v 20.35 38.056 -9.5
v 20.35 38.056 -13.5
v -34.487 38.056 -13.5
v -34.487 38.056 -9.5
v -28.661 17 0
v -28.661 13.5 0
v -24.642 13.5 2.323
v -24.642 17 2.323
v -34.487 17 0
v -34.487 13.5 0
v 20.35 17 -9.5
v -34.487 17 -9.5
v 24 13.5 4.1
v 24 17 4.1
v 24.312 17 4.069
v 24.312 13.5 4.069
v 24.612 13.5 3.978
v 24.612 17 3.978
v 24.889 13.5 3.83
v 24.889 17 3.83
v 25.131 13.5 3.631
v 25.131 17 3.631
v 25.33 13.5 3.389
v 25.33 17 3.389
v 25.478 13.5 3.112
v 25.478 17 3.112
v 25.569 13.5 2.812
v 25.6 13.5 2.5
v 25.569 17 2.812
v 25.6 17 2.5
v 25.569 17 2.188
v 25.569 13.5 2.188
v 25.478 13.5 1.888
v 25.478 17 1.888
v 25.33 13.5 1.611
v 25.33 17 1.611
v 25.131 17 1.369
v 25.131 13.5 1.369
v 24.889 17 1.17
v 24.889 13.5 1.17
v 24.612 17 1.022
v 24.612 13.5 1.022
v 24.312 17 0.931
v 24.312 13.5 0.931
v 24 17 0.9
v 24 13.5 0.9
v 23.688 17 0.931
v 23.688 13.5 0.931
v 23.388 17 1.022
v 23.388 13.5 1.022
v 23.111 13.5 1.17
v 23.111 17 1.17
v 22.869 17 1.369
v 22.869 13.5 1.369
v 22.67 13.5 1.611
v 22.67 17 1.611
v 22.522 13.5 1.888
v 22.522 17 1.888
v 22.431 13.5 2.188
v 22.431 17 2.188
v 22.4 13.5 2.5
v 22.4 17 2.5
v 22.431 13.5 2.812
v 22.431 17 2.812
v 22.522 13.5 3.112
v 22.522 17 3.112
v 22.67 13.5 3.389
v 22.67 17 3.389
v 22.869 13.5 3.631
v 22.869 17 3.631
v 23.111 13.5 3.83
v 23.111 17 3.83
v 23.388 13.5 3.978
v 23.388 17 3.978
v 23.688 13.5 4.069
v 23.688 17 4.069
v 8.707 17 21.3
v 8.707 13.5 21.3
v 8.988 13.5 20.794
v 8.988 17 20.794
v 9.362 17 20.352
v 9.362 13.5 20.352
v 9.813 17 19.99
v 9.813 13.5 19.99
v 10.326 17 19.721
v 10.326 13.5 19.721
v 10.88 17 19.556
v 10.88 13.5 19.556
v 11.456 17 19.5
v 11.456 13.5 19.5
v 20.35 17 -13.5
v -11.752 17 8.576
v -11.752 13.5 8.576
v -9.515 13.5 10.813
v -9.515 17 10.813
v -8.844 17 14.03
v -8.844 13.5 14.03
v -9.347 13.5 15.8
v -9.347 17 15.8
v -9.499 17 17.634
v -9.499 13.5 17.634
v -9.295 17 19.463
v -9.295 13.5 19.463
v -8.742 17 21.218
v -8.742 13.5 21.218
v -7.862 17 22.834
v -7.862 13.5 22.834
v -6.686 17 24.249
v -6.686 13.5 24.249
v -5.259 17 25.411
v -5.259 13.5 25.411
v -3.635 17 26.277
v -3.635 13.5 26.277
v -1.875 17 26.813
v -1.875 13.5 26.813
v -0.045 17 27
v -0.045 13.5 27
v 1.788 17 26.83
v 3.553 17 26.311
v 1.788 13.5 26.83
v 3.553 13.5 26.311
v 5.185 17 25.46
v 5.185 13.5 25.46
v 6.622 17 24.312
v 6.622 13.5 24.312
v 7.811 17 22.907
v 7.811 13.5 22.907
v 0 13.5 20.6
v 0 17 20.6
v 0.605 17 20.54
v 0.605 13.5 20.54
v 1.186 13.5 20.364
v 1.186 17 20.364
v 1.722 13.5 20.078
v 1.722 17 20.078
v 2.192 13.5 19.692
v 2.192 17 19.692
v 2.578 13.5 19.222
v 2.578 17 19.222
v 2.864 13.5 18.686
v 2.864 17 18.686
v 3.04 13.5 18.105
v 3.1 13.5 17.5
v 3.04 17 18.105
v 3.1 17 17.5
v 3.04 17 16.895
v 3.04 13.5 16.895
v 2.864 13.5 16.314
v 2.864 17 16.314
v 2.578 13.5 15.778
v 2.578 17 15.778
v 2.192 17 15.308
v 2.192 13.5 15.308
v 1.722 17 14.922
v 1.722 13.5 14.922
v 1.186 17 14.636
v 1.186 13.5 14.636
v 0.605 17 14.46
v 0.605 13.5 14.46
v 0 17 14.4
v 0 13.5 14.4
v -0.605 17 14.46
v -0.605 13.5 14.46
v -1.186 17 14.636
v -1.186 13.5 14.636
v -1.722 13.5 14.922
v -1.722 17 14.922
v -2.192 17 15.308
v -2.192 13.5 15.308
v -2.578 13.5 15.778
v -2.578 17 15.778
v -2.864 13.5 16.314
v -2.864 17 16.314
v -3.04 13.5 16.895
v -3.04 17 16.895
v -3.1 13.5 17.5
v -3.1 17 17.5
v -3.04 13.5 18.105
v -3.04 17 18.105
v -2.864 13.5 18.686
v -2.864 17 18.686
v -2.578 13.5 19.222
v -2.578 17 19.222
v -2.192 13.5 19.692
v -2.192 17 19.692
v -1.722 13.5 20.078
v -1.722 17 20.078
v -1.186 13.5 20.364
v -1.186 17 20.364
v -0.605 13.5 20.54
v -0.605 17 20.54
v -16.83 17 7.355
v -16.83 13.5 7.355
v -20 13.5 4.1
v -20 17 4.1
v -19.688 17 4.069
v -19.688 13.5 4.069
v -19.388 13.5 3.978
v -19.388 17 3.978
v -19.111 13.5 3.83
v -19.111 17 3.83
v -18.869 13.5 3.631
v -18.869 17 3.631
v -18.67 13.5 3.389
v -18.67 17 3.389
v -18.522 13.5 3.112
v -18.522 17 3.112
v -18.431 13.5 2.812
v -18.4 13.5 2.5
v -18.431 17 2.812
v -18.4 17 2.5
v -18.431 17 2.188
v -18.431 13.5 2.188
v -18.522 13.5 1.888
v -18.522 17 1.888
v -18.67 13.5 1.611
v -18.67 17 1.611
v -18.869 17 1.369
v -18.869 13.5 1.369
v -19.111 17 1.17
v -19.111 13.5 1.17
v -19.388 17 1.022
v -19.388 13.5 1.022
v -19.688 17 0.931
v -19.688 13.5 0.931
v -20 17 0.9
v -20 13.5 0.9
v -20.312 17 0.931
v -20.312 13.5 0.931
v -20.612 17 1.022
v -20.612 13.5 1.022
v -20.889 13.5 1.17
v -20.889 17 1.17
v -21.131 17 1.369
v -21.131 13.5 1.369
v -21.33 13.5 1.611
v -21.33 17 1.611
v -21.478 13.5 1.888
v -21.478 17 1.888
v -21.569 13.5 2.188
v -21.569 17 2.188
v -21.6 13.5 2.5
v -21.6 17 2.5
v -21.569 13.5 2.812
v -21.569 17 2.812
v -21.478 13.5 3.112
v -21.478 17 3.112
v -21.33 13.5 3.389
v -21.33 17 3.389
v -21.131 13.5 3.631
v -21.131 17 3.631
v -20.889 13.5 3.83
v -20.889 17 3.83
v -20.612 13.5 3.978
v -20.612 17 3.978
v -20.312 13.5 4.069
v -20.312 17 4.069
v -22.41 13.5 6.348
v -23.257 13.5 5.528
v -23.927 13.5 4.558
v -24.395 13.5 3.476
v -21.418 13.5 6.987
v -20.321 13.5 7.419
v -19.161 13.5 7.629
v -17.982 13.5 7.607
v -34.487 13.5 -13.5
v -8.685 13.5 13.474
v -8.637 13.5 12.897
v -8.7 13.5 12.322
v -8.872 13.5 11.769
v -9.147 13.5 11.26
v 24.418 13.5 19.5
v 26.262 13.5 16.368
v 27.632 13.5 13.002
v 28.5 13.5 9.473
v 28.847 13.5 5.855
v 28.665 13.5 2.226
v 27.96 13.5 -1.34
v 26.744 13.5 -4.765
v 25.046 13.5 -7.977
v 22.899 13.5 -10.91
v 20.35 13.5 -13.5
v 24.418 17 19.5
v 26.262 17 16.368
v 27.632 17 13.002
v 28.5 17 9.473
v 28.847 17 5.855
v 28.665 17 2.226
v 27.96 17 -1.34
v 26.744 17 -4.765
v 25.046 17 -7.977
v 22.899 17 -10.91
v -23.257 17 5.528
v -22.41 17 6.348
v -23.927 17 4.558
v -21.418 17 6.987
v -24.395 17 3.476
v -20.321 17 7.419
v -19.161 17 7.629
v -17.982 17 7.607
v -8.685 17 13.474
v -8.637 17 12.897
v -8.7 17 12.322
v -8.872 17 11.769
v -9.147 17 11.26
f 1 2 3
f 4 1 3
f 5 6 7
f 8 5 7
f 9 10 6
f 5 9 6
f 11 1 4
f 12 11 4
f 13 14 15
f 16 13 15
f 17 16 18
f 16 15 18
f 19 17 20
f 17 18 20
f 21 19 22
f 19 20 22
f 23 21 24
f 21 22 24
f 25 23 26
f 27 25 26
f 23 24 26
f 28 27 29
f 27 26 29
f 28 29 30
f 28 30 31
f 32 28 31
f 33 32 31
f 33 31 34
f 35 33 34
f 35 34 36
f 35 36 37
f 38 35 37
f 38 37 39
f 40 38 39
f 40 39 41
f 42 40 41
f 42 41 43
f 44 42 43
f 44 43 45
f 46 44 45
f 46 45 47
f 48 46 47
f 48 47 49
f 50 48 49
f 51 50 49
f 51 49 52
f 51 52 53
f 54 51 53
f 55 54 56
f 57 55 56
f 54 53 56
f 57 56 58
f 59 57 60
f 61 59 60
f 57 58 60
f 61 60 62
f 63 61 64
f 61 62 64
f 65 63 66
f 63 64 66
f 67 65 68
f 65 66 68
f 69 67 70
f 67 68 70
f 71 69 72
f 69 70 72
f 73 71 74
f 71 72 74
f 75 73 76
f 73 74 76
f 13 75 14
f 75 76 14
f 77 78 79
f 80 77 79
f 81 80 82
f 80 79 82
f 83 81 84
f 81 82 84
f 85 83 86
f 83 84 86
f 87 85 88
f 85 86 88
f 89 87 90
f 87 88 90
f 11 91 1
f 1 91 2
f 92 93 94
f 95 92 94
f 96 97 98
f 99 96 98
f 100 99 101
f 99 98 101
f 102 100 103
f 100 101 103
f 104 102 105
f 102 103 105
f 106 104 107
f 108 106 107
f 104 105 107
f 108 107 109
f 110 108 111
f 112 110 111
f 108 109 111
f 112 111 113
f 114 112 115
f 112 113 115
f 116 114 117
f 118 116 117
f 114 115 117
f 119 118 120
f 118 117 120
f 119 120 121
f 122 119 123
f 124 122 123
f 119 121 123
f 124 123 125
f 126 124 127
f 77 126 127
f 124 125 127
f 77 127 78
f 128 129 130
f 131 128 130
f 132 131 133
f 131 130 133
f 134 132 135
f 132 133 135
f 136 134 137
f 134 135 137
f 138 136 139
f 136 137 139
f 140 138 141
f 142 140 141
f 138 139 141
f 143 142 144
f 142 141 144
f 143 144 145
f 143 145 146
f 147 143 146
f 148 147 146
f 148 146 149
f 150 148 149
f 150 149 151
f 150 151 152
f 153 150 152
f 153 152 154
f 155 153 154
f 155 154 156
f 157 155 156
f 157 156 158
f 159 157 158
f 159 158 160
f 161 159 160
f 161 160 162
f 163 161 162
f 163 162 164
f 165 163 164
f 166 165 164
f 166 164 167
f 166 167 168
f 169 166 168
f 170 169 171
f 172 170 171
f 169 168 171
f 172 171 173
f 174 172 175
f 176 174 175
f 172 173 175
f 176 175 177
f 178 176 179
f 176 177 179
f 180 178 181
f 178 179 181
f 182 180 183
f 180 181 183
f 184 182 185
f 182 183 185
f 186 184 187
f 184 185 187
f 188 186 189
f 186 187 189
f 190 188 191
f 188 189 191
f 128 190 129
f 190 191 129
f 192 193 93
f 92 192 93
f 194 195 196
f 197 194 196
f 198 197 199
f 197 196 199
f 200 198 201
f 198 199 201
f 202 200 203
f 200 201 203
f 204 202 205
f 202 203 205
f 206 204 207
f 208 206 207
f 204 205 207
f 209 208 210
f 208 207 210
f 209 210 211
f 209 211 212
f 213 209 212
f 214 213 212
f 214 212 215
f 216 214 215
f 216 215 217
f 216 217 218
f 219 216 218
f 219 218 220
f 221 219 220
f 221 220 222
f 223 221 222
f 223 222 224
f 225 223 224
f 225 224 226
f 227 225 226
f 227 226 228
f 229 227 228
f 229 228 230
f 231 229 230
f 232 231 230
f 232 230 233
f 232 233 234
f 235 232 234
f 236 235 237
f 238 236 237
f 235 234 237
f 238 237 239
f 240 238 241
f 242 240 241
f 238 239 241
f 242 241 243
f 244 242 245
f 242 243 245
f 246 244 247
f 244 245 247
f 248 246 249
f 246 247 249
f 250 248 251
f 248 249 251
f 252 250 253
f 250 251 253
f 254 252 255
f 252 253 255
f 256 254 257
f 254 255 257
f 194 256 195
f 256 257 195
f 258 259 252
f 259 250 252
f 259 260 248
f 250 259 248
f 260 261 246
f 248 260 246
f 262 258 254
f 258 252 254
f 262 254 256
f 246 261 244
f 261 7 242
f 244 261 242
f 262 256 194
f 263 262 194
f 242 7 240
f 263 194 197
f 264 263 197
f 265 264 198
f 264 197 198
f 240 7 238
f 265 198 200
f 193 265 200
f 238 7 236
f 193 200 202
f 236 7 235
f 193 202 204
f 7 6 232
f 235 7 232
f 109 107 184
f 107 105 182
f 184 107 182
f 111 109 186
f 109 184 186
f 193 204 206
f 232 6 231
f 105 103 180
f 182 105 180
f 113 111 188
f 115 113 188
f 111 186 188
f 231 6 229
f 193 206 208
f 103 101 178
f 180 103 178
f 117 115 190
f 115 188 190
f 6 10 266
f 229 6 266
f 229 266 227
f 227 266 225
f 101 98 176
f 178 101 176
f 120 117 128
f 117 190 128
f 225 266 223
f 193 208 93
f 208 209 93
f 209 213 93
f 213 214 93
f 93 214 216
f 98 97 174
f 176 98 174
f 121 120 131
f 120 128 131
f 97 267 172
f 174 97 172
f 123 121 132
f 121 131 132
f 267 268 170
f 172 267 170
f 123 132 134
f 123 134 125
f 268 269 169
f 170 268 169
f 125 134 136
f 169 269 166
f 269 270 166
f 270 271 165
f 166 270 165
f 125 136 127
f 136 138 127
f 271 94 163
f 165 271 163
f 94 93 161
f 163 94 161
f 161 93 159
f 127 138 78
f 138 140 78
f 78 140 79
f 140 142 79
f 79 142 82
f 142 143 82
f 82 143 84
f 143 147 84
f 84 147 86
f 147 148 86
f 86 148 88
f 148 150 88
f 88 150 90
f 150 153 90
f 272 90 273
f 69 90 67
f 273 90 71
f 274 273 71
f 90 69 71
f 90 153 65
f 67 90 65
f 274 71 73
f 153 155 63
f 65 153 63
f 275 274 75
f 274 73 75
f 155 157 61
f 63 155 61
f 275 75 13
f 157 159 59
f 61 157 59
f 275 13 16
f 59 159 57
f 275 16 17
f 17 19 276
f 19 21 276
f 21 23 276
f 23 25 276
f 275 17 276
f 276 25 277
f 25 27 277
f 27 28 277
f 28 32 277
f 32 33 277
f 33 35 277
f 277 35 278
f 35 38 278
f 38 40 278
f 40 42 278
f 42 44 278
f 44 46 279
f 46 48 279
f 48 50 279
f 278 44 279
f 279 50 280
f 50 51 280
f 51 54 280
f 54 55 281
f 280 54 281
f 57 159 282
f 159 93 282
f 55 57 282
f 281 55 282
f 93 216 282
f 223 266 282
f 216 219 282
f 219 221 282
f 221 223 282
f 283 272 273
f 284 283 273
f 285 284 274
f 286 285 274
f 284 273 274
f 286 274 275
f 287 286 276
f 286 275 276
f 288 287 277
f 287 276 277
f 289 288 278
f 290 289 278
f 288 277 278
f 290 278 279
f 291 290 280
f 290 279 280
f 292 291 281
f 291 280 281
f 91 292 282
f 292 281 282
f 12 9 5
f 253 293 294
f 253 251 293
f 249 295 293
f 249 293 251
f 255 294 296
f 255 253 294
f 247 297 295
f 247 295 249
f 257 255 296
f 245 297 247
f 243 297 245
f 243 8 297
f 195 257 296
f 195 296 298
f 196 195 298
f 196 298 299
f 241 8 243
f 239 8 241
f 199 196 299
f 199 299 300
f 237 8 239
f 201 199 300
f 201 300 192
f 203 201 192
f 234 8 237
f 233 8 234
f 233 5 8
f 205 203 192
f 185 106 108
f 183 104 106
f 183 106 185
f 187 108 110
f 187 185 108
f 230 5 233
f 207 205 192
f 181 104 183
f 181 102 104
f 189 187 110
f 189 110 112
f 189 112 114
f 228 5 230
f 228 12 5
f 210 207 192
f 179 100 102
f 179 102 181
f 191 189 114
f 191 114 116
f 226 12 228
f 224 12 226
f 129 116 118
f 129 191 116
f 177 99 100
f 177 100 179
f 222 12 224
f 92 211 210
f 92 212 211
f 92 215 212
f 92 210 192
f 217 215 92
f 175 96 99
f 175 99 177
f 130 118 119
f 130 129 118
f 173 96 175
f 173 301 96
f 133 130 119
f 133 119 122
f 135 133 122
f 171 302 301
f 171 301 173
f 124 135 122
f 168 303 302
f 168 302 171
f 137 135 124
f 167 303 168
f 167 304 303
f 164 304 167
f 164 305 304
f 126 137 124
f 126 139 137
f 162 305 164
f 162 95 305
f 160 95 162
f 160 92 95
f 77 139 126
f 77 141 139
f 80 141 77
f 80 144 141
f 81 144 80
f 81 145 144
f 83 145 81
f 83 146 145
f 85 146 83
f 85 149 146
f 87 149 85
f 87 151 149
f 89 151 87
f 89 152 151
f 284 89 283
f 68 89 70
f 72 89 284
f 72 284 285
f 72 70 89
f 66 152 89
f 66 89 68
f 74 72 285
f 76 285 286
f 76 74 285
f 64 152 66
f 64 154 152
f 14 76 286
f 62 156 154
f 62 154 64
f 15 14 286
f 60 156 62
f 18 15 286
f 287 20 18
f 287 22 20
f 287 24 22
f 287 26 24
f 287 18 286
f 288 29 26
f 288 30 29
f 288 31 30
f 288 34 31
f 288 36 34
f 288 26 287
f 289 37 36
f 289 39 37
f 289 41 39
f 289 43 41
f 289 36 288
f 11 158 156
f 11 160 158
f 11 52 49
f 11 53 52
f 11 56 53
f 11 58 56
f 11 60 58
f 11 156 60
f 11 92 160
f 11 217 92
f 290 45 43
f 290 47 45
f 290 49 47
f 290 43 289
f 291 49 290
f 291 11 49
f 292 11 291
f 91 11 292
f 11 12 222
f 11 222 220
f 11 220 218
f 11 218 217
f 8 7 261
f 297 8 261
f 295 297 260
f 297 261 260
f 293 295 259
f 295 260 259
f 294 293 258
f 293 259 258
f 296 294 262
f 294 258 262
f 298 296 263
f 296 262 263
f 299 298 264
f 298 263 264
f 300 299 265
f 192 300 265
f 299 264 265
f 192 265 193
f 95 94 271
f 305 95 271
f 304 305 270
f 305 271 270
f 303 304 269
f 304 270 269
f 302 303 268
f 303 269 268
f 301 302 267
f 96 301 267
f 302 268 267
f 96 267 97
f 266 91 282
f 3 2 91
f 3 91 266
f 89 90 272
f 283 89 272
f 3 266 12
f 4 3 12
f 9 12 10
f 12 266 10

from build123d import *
from build123d.topology import SkipClean

# Parameters (mm, degrees)
CROQUIS1_W              = 70
CROQUIS1_H              = 65
EXTRUIR1_DEPTH          = 3.5
CROQUIS2_R              = 3.1
EXTRUIR2_DEPTH          = 5
EXTRUIR3_DEPTH          = 10
CROQUIS4_OUTSIDE_W      = 91.294
CROQUIS4_OUTSIDE_H      = 86.294
EXTRUIR4_DEPTH          = 10
REDONDEO1_R             = 3
EXTRUIR5_DEPTH          = 13.5
EXTRUIR6_DEPTH          = 3.5
CROQUIS7_R              = 1.6
EXTRUIR7_DEPTH          = 47.982330447
CROQUIS8_R              = 3.1
EXTRUIR8_DEPTH          = 5
CROQUIS9_W              = 0.7
CROQUIS9_H              = 10.5
EXTRUIR9_DEPTH          = 10
EXTRUIR10_DEPTH         = 63.752948337
EXTRUIR10_DEPTH_BACK    = 10
CROQUIS10_W             = 3.0625
CROQUIS10_H             = 5
CROQUIS11_W             = 54.8364
CROQUIS11_H             = 21.05596306
SALIENTE_EXTRUIR1_DEPTH = 4


with BuildPart() as part:
    # Croquis1 → Extruir1 (new body)
    with BuildSketch(Plane(origin=(0, 0, 0), x_dir=(1, 0, 0), z_dir=(0, 1, 0))):
        Rectangle(CROQUIS1_W, CROQUIS1_H)
    extrude(amount=EXTRUIR1_DEPTH)

    # Croquis2 → Extruir2 (cut)
    with BuildSketch(Plane(origin=(0, 3.5, 0), x_dir=(1, 0, 0), z_dir=(0, 1, 0))):
        with Locations(Location((0, -17.5, 0), (0, 0, 270))):
            Circle(CROQUIS2_R)
    extrude(amount=-EXTRUIR2_DEPTH, mode=Mode.SUBTRACT)

    # Croquis3 → Extruir3 (add)
    with BuildSketch(Plane(origin=(0, 3.5, 0), x_dir=(1, 0, 0), z_dir=(0, 1, 0))):
        with BuildLine():
            Line((-34.4868, 13.5), (20.3496, 13.5))
            Line((20.3496, 13.5), (20.3496, 0))
            Line((20.3496, 0), (17.146428199, 0))
            ThreePointArc((17.146428199, 0), (22.955777517, -8.939493087), (24.418230894, -19.5))
            Line((24.418230894, -19.5), (9.287087811, -19.5))
            ThreePointArc((9.287087811, -19.5), (-3.635492607, -26.276855559), (-7.981176331, -12.347250794))
            Line((-7.981176331, -12.347250794), (-18.680510212, -1.647916913))
            ThreePointArc((-18.680510212, -1.647916913), (-17.932408832, -0.806327142), (-17.146428199, 0))
            Line((-17.146428199, 0), (-34.4868, 0))
            Line((-34.4868, 0), (-34.4868, 13.5))
        make_face()
        with BuildLine():
            Line((-32.9868, 1.5), (-12.961481397, 1.5))
            ThreePointArc((-12.961481397, 1.5), (-14.868021343, 0.048274597), (-16.613165932, -1.593940849))
            Line((-16.613165932, -1.593940849), (-5.999348286, -12.207758495))
            ThreePointArc((-5.999348286, -12.207758495), (-3.061467459, -24.89103626), (7.984359711, -18))
            Line((7.984359711, -18), (22.994564575, -18))
            ThreePointArc((22.994564575, -18), (20.451694563, -6.977253708), (12.961481397, 1.5))
            Line((12.961481397, 1.5), (18.8496, 1.5))
            Line((18.8496, 1.5), (18.8496, 12))
            Line((18.8496, 12), (-32.9868, 12))
            Line((-32.9868, 12), (-32.9868, 1.5))
        make_face(mode=Mode.SUBTRACT)
    extrude(amount=EXTRUIR3_DEPTH)

    # Croquis4 outside → Extruir4 (cut)
    with SkipClean():  # the faces are left unmerged after this step: merging them gives an invalid solid
        with BuildSketch(Plane(origin=(0, 3.5, 0), x_dir=(1, 0, 0), z_dir=(0, 1, 0))):
            Rectangle(CROQUIS4_OUTSIDE_W, CROQUIS4_OUTSIDE_H)
            with BuildLine():
                Line((-34.4868, 0), (-17.146428199, 0))
                ThreePointArc((-17.146428199, 0), (-17.932408832, -0.806327142), (-18.680510212, -1.647916913))
                Line((-18.680510212, -1.647916913), (-7.981176331, -12.347250794))
                ThreePointArc((-7.981176331, -12.347250794), (-3.635492607, -26.276855559), (9.287087811, -19.5))
                Line((9.287087811, -19.5), (24.418230894, -19.5))
                ThreePointArc((24.418230894, -19.5), (22.955777517, -8.939493087), (17.146428199, 0))
                Line((17.146428199, 0), (20.3496, 0))
                Line((20.3496, 0), (20.3496, 13.5))
                Line((20.3496, 13.5), (-34.4868, 13.5))
                Line((-34.4868, 13.5), (-34.4868, 0))
            make_face(mode=Mode.SUBTRACT)
        extrude(amount=-EXTRUIR4_DEPTH, mode=Mode.SUBTRACT)

    # Redondeo1
    redondeo1_edges = [part.edges().sort_by_distance(p)[0] for p in [
        (-7.981176331, 8.5, 12.347250794),
        (9.287087811, 8.5, 19.5),
        (-5.999348286, 8.5, 12.207758495),
        (7.984359711, 8.5, 18),
    ]]
    fillet(redondeo1_edges, radius=REDONDEO1_R)

    # Croquis5 → Extruir5 (add)
    with SkipClean():  # the faces are left unmerged after this step: merging them gives an invalid solid
        with BuildSketch(Plane.XZ):
            with BuildLine():
                Line((-18.680510212, 1.647916913), (-14.437869525, 5.8905576))
                ThreePointArc((-14.437869525, 5.8905576), (-21.723092903, 6.819250451), (-24.449770984, 0))
                Line((-24.449770984, 0), (-17.146428199, 0))
                ThreePointArc((-17.146428199, 0), (-17.932408832, 0.806327142), (-18.680510212, 1.647916913))
            make_face()
            with BuildLine():
                Line((20.3496, 0), (20.3496, -13.5))
                ThreePointArc((20.3496, -13.5), (28.665212431, 2.225567304), (24.418230894, 19.5))
                ThreePointArc((24.418230894, 19.5), (22.955777517, 8.939493087), (17.146428199, 0))
                Line((17.146428199, 0), (20.3496, 0))
            make_face()
        extrude(amount=-EXTRUIR5_DEPTH)

    # Chaflán1
    # the kernel refuses this chamfer: 5, 4.044665138 mm, written as the material it adds along each edge
    with BuildSketch(Plane(origin=(-14.437869525, 3.5, 5.8905576), x_dir=(-0.8528028654224412, 0, 0.5222329678670944), z_dir=(0, 1, 0))) as chafl_n1_piece_1:
        with BuildLine():
            Line((2.946399951, -0.141421356), (-1.029187491, 3.834166086))
            Line((-1.029187491, 3.834166086), (-1.126417207, 3.810791264))
            ThreePointArc((-1.126417207, 3.810791264), (-0.561046898, 1.905915324), (-0.097229716, -0.023374822))
            Line((-0.097229716, -0.023374822), (0.023374822, -0.097229716))
            ThreePointArc((0.023374822, -0.097229716), (1.474874577, 0.065772974), (2.923025129, -0.238651072))
            Line((2.923025129, -0.238651072), (2.946399951, -0.141421356))
        make_face()
    extrude(amount=10)
    with BuildSketch(Plane(origin=(-24.449770984, 3.5, 0), x_dir=(-0.08263556343231732, 0, 0.9965798330571533), z_dir=(0, 1, 0))) as chafl_n1_piece_2:
        with BuildLine():
            Line((2.416506842, 0.180832589), (0.262590721, -4.378032196))
            Line((0.262590721, -4.378032196), (0.162932738, -4.386295752))
            ThreePointArc((0.162932738, -4.386295752), (0.081510488, -2.193144218), (-0.099657983, -0.008263556))
            Line((-0.099657983, -0.008263556), (0.019425577, 0.098095091))
            ThreePointArc((0.019425577, 0.098095091), (1.209024094, -0.014134236), (2.397081265, 0.278927681))
            Line((2.397081265, 0.278927681), (2.416506842, 0.180832589))
        make_face()
    extrude(amount=10)
    with BuildSketch(Plane(origin=(-24.449770984, 0, 0), x_dir=(-1, 0, 0), z_dir=(0, 1, 0))) as chafl_n1_piece_3:
        with BuildLine():
            Line((4.384757927, -0.10008854), (0.019475293, 2.423185189))
            Line((0.019475293, 2.423185189), (-0.079889541, 2.411932193))
            ThreePointArc((-0.079889541, 2.411932193), (0.113994282, 1.203721039), (-0.096154346, 0.027465282))
            Line((-0.096154346, 0.027465282), (0, -0.1))
            ThreePointArc((0, -0.1), (2.192378963, -0.1), (4.384757927, -0.20008854))
            Line((4.384757927, -0.20008854), (4.384757927, -0.10008854))
        make_face()
    extrude(amount=3.5)
    with BuildSketch(Plane(origin=(-14.437869525, 0, 5.8905576), x_dir=(0.7071067811865478, 0, 0.7071067811865472), z_dir=(0, 1, 0))) as chafl_n1_piece_4:
        with BuildLine():
            Line((3.968519544, 0.104446594), (-0.826219316, -2.831719321))
            Line((-0.826219316, -2.831719321), (-0.91529167, -2.786264775))
            ThreePointArc((-0.91529167, -2.786264775), (-0.280798425, -1.449390681), (-0.1, 0))
            Line((-0.1, 0), (0, 0.1))
            ThreePointArc((0, 0.1), (1.984259772, 0.1), (3.968519544, 0.204446594))
            Line((3.968519544, 0.204446594), (3.968519544, 0.104446594))
        make_face()
    extrude(amount=3.5)


with BuildPart() as body_2:
    # Croquis6 → Extruir6 (new body)
    with BuildSketch(Plane(origin=(0, 13.5, 0), x_dir=(1, 0, 0), z_dir=(0, 1, 0))):
        with BuildLine():
            Line((-34.4868, 13.5), (-34.4868, 0))
            Line((-34.4868, 0), (-28.661374979, 0))
            Line((-28.661374979, 0), (-24.642400208, -2.323096648))
            ThreePointArc((-24.642400208, -2.323096648), (-21.929637735, -6.692039268), (-16.829963308, -7.355409896))
            Line((-16.829963308, -7.355409896), (-11.752306982, -8.576120143))
            Line((-11.752306982, -8.576120143), (-9.515139435, -10.813287689))
            ThreePointArc((-9.515139435, -10.813287689), (-8.69974084, -12.321679102), (-8.843709432, -14.030302105))
            ThreePointArc((-8.843709432, -14.030302105), (-3.635492607, -26.276855559), (8.70689382, -21.3))
            ThreePointArc((8.70689382, -21.3), (9.813271565, -19.99001992), (11.456439237, -19.5))
            Line((11.456439237, -19.5), (24.418230894, -19.5))
            ThreePointArc((24.418230894, -19.5), (28.665212431, -2.225567304), (20.3496, 13.5))
            Line((20.3496, 13.5), (-34.4868, 13.5))
        make_face()
    extrude(amount=EXTRUIR6_DEPTH)


with BuildPart() as extruir7_tool:
    # Croquis7 → Extruir7 (new, through all)
    with BuildSketch(Plane(origin=(0, 17, 0), x_dir=(1, 0, 0), z_dir=(0, 1, 0))):
        with Locations(Location((-20, -2.5, 0), (0, 0, 270))):
            Circle(CROQUIS7_R)
        with Locations(Location((24, -2.5, 0), (0, 0, 270))):
            Circle(CROQUIS7_R)
    extrude(amount=-EXTRUIR7_DEPTH)


with BuildPart() as part_1:
    add(part.part)

    # Extruir7: cut by extruir7_tool
    add(extruir7_tool.part, mode=Mode.SUBTRACT)

    # Croquis9 → Extruir9 (cut)
    with BuildSketch(Plane(origin=(0, 13.5, 0), x_dir=(1, 0, 0), z_dir=(0, 1, 0))):
        with Locations((19.1996, 6.75)):
            Rectangle(CROQUIS9_W, CROQUIS9_H)
    extrude(amount=-EXTRUIR9_DEPTH, mode=Mode.SUBTRACT)

    # Croquis10 → Extruir10 (cut, two sides: drawn at the far end of the back side and taken through both)
    with BuildSketch(Plane.ZY.offset(-19.5496).offset(-EXTRUIR10_DEPTH_BACK)):
        with Locations((-8.9375, 8.5)):
            Rectangle(CROQUIS10_W, CROQUIS10_H)
    extrude(amount=EXTRUIR10_DEPTH + EXTRUIR10_DEPTH_BACK, mode=Mode.SUBTRACT)


with BuildPart() as body_2_1:
    add(body_2.part)

    # Extruir7: cut by extruir7_tool
    add(extruir7_tool.part, mode=Mode.SUBTRACT)

    # Croquis8 → Extruir8 (cut)
    with BuildSketch(Plane(origin=(0, 17, 0), x_dir=(1, 0, 0), z_dir=(0, 1, 0))):
        with Locations(Location((0, -17.5, 0), (0, 0, 270))):
            Circle(CROQUIS8_R)
    extrude(amount=-EXTRUIR8_DEPTH, mode=Mode.SUBTRACT)

    # Croquis11 → Saliente-Extruir1 (add)
    with BuildSketch(Plane(origin=(0, 0, -13.5), x_dir=(-1, 0, 0), z_dir=(0, 0, -1))):
        with Locations((7.0686, 27.52798153)):
            Rectangle(CROQUIS11_W, CROQUIS11_H)
    extrude(amount=-SALIENTE_EXTRUIR1_DEPTH)


solid = body_2_1.part
